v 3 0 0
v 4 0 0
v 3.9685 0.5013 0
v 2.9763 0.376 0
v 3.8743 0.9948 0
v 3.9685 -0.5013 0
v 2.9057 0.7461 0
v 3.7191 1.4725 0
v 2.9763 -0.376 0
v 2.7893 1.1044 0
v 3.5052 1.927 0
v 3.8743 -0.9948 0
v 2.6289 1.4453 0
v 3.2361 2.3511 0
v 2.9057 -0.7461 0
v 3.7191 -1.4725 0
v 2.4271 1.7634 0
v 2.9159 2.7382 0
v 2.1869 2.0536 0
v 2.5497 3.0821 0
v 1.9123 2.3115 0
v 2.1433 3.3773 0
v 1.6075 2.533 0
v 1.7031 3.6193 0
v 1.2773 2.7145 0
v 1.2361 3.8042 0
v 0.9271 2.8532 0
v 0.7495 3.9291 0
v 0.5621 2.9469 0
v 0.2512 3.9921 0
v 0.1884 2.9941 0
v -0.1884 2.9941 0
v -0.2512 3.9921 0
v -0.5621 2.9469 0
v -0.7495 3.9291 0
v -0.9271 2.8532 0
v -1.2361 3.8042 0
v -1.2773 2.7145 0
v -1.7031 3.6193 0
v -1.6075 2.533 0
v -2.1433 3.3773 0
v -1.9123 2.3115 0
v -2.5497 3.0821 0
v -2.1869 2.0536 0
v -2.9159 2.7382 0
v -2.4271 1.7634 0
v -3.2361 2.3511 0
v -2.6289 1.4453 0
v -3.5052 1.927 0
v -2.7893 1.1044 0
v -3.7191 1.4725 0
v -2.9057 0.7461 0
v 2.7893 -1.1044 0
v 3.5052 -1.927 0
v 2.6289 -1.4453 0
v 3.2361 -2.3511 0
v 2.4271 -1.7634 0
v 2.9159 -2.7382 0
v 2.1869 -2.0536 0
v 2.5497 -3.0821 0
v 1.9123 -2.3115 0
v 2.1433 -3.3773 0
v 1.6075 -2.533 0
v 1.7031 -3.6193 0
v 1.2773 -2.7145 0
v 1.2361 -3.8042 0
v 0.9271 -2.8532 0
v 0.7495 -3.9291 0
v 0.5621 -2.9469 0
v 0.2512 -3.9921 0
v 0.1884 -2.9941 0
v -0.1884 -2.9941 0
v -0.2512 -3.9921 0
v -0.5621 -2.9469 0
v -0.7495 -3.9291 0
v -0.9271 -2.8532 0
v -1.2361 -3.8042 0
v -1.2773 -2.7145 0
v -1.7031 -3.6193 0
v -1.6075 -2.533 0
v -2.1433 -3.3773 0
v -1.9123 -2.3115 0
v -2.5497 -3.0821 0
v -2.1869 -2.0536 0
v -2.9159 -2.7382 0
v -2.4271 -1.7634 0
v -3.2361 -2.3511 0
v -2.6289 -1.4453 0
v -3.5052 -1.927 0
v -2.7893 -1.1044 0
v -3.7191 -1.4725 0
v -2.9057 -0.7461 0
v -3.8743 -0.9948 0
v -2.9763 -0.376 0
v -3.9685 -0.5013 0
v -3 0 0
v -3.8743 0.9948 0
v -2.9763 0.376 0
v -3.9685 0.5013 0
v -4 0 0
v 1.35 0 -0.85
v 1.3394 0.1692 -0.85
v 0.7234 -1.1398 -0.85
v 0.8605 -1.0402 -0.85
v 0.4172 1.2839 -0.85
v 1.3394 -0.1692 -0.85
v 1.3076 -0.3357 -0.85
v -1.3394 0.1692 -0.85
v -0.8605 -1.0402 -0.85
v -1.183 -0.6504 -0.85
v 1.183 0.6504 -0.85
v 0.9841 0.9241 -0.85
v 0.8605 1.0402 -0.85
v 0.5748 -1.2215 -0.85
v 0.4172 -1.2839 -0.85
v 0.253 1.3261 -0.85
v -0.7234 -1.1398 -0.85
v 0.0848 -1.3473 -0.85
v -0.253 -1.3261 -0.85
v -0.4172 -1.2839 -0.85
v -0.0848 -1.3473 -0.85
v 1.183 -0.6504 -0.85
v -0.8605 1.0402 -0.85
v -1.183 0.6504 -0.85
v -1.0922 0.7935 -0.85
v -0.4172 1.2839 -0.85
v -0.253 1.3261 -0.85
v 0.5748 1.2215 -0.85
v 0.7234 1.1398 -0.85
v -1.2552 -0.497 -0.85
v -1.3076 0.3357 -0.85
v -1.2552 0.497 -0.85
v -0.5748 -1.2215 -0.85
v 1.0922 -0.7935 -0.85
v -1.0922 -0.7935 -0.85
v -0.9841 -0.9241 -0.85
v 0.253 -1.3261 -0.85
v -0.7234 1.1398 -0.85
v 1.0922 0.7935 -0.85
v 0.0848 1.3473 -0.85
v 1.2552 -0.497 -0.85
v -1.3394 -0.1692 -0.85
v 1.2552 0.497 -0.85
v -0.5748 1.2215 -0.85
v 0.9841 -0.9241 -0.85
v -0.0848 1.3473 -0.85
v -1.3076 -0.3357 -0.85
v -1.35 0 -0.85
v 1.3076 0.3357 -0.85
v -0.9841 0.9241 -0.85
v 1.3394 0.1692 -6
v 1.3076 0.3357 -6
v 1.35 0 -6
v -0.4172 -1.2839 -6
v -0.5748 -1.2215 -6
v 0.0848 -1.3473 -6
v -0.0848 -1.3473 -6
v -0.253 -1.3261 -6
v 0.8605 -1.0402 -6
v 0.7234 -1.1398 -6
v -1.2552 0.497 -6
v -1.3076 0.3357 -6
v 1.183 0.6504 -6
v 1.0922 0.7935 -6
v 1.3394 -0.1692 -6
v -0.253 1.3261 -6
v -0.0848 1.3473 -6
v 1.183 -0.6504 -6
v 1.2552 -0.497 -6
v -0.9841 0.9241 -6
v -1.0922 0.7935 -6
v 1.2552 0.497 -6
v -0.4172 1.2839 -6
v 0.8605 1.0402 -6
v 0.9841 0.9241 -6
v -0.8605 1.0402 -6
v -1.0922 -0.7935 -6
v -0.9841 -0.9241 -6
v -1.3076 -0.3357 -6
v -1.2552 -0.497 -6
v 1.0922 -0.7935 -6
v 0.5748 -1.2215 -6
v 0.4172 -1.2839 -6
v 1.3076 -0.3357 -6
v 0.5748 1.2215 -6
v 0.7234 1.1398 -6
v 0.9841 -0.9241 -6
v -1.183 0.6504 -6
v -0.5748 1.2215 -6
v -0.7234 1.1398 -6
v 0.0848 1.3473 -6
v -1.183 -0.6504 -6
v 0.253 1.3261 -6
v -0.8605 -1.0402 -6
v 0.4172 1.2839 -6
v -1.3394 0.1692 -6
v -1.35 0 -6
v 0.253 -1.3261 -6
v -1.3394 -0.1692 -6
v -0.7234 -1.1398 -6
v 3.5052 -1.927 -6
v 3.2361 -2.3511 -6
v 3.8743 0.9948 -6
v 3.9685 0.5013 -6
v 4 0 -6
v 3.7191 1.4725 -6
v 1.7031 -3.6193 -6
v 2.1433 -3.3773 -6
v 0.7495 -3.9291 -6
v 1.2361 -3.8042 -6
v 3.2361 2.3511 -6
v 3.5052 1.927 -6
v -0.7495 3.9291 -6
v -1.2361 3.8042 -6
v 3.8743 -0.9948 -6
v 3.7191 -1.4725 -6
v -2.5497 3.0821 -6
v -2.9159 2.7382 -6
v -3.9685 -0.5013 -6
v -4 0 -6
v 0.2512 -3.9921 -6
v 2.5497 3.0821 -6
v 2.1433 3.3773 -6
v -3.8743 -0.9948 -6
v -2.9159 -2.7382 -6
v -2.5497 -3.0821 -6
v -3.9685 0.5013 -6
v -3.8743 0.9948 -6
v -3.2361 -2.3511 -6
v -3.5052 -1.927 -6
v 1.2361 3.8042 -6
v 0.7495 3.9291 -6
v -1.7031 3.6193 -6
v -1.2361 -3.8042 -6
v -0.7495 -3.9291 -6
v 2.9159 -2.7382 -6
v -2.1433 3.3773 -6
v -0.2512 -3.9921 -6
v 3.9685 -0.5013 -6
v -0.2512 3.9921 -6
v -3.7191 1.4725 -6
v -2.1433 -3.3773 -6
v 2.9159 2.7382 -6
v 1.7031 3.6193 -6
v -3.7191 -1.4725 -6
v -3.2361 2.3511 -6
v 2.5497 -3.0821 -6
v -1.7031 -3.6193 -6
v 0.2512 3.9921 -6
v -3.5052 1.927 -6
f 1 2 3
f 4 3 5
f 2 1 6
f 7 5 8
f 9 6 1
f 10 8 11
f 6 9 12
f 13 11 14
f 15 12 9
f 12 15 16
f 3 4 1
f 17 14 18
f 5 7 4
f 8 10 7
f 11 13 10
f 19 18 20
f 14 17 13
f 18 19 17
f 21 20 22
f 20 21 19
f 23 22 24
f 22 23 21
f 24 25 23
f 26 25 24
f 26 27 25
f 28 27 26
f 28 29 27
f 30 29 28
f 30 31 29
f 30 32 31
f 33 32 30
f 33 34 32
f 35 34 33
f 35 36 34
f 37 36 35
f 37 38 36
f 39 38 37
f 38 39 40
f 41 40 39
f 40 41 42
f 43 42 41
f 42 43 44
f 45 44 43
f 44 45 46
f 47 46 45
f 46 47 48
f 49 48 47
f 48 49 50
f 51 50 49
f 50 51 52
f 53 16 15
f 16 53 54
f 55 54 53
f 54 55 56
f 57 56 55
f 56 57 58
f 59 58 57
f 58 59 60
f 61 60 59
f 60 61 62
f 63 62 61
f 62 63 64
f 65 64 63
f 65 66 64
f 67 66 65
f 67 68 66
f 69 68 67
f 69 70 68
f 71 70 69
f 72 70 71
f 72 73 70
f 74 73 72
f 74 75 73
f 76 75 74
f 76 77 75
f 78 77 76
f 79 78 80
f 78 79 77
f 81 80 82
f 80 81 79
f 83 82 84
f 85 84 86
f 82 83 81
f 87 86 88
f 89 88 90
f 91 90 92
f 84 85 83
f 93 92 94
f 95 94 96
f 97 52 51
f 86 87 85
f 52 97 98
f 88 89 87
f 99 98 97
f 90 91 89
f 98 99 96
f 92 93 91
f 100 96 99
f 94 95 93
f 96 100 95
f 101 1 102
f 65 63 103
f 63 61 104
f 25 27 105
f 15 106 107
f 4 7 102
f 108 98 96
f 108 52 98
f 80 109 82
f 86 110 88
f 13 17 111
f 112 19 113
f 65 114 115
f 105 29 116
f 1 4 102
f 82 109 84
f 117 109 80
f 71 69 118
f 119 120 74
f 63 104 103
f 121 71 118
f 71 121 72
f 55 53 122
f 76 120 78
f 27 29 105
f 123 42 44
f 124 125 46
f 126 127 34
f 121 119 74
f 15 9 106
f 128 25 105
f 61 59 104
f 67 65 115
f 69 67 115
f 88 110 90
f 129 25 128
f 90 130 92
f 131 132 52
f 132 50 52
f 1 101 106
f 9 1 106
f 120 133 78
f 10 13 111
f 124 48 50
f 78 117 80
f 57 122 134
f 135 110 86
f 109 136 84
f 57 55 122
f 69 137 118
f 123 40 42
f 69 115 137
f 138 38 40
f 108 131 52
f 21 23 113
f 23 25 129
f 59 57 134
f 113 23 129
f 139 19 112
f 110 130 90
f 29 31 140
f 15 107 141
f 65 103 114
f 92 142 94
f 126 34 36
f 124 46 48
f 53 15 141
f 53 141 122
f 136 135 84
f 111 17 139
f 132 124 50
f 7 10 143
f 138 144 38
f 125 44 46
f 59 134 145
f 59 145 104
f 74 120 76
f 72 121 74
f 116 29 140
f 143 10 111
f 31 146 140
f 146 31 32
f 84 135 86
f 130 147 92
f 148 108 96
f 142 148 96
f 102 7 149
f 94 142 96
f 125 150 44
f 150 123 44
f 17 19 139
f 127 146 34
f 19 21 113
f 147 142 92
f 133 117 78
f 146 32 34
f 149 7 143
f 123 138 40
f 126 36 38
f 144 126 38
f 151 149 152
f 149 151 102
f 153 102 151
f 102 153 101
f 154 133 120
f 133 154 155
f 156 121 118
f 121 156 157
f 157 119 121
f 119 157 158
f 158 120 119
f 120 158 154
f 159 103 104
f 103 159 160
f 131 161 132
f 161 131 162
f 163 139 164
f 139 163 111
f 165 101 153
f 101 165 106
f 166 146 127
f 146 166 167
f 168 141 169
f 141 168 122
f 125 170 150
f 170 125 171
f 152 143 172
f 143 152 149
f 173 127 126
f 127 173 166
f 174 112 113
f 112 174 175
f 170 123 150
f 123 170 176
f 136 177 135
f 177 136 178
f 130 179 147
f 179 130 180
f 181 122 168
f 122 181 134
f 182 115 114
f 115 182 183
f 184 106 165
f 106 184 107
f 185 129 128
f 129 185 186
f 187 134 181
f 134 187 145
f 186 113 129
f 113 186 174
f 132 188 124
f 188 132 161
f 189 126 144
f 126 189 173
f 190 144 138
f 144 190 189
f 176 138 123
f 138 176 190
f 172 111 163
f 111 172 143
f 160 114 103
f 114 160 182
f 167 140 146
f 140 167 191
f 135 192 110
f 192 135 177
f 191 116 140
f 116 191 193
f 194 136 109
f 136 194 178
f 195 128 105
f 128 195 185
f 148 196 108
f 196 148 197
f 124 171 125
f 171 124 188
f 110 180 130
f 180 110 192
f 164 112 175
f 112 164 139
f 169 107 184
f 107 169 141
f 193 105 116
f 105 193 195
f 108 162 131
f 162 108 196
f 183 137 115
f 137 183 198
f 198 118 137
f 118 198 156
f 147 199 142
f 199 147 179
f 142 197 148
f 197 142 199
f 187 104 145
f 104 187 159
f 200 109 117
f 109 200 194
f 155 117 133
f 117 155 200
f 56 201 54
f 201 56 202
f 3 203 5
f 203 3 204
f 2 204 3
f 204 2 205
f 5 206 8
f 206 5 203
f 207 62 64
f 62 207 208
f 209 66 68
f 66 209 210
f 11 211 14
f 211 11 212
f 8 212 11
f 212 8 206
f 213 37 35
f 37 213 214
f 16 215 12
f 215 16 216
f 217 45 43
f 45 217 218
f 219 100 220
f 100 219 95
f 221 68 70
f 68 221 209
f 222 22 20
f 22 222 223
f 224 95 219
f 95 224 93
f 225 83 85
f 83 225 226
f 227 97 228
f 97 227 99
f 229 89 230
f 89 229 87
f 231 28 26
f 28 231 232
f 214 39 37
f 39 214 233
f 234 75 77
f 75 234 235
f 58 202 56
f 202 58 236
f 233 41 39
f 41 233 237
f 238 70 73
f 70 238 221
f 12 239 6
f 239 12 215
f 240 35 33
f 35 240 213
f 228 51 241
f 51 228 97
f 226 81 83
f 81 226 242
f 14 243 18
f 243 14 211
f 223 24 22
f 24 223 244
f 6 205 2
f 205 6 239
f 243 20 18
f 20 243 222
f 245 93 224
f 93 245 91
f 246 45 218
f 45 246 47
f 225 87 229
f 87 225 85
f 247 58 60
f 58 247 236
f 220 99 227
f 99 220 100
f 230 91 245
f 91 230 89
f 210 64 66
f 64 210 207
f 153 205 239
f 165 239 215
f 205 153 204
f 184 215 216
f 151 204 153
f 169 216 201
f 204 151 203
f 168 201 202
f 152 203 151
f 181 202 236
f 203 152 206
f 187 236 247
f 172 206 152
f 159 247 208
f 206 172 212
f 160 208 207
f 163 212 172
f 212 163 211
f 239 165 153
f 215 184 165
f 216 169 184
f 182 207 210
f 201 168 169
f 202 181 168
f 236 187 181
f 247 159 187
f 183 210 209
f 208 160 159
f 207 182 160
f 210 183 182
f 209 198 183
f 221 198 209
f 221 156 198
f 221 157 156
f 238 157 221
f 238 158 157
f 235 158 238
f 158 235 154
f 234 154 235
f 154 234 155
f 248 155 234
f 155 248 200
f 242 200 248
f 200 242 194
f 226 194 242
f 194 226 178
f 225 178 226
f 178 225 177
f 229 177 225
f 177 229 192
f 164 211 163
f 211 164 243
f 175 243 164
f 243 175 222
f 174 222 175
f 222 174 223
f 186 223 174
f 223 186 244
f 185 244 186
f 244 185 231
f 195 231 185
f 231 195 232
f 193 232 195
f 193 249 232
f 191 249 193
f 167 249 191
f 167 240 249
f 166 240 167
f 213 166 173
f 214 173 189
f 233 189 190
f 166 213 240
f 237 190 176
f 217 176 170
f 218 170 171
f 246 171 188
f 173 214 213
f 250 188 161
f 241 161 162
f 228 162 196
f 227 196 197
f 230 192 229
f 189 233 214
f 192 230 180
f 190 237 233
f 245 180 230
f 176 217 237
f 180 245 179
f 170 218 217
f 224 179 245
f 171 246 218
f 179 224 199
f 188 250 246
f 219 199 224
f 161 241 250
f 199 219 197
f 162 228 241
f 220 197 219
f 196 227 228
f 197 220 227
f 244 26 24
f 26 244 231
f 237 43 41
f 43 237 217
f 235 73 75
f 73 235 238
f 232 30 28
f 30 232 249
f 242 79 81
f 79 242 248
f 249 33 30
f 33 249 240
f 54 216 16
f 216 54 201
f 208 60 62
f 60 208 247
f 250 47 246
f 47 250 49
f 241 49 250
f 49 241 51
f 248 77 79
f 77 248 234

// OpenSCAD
$fn = 50;

difference() {
	union() {
		translate(v = [0, 0, -6.0]) {
			cylinder(h = 9, r = 4.0);
		}
	}
	union() {
		translate(v = [0, 0, 0]) {
			rotate(a = [0, 0, 0]) {
				difference() {
					union() {
						translate(v = [0, 0, -9.0]) {
							cylinder(h = 9, r = 1.0);
						}
						translate(v = [0, 0, -0.85]) {
							cylinder(h = 0.85, r1 = 1.35, r2 = 3.0);
						}
						translate(v = [0, 0, -9.0]) {
							cylinder(h = 9, r = 1.35);
						}
						translate(v = [0, 0, -9.0]) {
							cylinder(h = 9, r = 1.0);
						}
					}
					union();
				}
			}
		}
		#cylinder(h = 3, r = 5.0);
	}
}
